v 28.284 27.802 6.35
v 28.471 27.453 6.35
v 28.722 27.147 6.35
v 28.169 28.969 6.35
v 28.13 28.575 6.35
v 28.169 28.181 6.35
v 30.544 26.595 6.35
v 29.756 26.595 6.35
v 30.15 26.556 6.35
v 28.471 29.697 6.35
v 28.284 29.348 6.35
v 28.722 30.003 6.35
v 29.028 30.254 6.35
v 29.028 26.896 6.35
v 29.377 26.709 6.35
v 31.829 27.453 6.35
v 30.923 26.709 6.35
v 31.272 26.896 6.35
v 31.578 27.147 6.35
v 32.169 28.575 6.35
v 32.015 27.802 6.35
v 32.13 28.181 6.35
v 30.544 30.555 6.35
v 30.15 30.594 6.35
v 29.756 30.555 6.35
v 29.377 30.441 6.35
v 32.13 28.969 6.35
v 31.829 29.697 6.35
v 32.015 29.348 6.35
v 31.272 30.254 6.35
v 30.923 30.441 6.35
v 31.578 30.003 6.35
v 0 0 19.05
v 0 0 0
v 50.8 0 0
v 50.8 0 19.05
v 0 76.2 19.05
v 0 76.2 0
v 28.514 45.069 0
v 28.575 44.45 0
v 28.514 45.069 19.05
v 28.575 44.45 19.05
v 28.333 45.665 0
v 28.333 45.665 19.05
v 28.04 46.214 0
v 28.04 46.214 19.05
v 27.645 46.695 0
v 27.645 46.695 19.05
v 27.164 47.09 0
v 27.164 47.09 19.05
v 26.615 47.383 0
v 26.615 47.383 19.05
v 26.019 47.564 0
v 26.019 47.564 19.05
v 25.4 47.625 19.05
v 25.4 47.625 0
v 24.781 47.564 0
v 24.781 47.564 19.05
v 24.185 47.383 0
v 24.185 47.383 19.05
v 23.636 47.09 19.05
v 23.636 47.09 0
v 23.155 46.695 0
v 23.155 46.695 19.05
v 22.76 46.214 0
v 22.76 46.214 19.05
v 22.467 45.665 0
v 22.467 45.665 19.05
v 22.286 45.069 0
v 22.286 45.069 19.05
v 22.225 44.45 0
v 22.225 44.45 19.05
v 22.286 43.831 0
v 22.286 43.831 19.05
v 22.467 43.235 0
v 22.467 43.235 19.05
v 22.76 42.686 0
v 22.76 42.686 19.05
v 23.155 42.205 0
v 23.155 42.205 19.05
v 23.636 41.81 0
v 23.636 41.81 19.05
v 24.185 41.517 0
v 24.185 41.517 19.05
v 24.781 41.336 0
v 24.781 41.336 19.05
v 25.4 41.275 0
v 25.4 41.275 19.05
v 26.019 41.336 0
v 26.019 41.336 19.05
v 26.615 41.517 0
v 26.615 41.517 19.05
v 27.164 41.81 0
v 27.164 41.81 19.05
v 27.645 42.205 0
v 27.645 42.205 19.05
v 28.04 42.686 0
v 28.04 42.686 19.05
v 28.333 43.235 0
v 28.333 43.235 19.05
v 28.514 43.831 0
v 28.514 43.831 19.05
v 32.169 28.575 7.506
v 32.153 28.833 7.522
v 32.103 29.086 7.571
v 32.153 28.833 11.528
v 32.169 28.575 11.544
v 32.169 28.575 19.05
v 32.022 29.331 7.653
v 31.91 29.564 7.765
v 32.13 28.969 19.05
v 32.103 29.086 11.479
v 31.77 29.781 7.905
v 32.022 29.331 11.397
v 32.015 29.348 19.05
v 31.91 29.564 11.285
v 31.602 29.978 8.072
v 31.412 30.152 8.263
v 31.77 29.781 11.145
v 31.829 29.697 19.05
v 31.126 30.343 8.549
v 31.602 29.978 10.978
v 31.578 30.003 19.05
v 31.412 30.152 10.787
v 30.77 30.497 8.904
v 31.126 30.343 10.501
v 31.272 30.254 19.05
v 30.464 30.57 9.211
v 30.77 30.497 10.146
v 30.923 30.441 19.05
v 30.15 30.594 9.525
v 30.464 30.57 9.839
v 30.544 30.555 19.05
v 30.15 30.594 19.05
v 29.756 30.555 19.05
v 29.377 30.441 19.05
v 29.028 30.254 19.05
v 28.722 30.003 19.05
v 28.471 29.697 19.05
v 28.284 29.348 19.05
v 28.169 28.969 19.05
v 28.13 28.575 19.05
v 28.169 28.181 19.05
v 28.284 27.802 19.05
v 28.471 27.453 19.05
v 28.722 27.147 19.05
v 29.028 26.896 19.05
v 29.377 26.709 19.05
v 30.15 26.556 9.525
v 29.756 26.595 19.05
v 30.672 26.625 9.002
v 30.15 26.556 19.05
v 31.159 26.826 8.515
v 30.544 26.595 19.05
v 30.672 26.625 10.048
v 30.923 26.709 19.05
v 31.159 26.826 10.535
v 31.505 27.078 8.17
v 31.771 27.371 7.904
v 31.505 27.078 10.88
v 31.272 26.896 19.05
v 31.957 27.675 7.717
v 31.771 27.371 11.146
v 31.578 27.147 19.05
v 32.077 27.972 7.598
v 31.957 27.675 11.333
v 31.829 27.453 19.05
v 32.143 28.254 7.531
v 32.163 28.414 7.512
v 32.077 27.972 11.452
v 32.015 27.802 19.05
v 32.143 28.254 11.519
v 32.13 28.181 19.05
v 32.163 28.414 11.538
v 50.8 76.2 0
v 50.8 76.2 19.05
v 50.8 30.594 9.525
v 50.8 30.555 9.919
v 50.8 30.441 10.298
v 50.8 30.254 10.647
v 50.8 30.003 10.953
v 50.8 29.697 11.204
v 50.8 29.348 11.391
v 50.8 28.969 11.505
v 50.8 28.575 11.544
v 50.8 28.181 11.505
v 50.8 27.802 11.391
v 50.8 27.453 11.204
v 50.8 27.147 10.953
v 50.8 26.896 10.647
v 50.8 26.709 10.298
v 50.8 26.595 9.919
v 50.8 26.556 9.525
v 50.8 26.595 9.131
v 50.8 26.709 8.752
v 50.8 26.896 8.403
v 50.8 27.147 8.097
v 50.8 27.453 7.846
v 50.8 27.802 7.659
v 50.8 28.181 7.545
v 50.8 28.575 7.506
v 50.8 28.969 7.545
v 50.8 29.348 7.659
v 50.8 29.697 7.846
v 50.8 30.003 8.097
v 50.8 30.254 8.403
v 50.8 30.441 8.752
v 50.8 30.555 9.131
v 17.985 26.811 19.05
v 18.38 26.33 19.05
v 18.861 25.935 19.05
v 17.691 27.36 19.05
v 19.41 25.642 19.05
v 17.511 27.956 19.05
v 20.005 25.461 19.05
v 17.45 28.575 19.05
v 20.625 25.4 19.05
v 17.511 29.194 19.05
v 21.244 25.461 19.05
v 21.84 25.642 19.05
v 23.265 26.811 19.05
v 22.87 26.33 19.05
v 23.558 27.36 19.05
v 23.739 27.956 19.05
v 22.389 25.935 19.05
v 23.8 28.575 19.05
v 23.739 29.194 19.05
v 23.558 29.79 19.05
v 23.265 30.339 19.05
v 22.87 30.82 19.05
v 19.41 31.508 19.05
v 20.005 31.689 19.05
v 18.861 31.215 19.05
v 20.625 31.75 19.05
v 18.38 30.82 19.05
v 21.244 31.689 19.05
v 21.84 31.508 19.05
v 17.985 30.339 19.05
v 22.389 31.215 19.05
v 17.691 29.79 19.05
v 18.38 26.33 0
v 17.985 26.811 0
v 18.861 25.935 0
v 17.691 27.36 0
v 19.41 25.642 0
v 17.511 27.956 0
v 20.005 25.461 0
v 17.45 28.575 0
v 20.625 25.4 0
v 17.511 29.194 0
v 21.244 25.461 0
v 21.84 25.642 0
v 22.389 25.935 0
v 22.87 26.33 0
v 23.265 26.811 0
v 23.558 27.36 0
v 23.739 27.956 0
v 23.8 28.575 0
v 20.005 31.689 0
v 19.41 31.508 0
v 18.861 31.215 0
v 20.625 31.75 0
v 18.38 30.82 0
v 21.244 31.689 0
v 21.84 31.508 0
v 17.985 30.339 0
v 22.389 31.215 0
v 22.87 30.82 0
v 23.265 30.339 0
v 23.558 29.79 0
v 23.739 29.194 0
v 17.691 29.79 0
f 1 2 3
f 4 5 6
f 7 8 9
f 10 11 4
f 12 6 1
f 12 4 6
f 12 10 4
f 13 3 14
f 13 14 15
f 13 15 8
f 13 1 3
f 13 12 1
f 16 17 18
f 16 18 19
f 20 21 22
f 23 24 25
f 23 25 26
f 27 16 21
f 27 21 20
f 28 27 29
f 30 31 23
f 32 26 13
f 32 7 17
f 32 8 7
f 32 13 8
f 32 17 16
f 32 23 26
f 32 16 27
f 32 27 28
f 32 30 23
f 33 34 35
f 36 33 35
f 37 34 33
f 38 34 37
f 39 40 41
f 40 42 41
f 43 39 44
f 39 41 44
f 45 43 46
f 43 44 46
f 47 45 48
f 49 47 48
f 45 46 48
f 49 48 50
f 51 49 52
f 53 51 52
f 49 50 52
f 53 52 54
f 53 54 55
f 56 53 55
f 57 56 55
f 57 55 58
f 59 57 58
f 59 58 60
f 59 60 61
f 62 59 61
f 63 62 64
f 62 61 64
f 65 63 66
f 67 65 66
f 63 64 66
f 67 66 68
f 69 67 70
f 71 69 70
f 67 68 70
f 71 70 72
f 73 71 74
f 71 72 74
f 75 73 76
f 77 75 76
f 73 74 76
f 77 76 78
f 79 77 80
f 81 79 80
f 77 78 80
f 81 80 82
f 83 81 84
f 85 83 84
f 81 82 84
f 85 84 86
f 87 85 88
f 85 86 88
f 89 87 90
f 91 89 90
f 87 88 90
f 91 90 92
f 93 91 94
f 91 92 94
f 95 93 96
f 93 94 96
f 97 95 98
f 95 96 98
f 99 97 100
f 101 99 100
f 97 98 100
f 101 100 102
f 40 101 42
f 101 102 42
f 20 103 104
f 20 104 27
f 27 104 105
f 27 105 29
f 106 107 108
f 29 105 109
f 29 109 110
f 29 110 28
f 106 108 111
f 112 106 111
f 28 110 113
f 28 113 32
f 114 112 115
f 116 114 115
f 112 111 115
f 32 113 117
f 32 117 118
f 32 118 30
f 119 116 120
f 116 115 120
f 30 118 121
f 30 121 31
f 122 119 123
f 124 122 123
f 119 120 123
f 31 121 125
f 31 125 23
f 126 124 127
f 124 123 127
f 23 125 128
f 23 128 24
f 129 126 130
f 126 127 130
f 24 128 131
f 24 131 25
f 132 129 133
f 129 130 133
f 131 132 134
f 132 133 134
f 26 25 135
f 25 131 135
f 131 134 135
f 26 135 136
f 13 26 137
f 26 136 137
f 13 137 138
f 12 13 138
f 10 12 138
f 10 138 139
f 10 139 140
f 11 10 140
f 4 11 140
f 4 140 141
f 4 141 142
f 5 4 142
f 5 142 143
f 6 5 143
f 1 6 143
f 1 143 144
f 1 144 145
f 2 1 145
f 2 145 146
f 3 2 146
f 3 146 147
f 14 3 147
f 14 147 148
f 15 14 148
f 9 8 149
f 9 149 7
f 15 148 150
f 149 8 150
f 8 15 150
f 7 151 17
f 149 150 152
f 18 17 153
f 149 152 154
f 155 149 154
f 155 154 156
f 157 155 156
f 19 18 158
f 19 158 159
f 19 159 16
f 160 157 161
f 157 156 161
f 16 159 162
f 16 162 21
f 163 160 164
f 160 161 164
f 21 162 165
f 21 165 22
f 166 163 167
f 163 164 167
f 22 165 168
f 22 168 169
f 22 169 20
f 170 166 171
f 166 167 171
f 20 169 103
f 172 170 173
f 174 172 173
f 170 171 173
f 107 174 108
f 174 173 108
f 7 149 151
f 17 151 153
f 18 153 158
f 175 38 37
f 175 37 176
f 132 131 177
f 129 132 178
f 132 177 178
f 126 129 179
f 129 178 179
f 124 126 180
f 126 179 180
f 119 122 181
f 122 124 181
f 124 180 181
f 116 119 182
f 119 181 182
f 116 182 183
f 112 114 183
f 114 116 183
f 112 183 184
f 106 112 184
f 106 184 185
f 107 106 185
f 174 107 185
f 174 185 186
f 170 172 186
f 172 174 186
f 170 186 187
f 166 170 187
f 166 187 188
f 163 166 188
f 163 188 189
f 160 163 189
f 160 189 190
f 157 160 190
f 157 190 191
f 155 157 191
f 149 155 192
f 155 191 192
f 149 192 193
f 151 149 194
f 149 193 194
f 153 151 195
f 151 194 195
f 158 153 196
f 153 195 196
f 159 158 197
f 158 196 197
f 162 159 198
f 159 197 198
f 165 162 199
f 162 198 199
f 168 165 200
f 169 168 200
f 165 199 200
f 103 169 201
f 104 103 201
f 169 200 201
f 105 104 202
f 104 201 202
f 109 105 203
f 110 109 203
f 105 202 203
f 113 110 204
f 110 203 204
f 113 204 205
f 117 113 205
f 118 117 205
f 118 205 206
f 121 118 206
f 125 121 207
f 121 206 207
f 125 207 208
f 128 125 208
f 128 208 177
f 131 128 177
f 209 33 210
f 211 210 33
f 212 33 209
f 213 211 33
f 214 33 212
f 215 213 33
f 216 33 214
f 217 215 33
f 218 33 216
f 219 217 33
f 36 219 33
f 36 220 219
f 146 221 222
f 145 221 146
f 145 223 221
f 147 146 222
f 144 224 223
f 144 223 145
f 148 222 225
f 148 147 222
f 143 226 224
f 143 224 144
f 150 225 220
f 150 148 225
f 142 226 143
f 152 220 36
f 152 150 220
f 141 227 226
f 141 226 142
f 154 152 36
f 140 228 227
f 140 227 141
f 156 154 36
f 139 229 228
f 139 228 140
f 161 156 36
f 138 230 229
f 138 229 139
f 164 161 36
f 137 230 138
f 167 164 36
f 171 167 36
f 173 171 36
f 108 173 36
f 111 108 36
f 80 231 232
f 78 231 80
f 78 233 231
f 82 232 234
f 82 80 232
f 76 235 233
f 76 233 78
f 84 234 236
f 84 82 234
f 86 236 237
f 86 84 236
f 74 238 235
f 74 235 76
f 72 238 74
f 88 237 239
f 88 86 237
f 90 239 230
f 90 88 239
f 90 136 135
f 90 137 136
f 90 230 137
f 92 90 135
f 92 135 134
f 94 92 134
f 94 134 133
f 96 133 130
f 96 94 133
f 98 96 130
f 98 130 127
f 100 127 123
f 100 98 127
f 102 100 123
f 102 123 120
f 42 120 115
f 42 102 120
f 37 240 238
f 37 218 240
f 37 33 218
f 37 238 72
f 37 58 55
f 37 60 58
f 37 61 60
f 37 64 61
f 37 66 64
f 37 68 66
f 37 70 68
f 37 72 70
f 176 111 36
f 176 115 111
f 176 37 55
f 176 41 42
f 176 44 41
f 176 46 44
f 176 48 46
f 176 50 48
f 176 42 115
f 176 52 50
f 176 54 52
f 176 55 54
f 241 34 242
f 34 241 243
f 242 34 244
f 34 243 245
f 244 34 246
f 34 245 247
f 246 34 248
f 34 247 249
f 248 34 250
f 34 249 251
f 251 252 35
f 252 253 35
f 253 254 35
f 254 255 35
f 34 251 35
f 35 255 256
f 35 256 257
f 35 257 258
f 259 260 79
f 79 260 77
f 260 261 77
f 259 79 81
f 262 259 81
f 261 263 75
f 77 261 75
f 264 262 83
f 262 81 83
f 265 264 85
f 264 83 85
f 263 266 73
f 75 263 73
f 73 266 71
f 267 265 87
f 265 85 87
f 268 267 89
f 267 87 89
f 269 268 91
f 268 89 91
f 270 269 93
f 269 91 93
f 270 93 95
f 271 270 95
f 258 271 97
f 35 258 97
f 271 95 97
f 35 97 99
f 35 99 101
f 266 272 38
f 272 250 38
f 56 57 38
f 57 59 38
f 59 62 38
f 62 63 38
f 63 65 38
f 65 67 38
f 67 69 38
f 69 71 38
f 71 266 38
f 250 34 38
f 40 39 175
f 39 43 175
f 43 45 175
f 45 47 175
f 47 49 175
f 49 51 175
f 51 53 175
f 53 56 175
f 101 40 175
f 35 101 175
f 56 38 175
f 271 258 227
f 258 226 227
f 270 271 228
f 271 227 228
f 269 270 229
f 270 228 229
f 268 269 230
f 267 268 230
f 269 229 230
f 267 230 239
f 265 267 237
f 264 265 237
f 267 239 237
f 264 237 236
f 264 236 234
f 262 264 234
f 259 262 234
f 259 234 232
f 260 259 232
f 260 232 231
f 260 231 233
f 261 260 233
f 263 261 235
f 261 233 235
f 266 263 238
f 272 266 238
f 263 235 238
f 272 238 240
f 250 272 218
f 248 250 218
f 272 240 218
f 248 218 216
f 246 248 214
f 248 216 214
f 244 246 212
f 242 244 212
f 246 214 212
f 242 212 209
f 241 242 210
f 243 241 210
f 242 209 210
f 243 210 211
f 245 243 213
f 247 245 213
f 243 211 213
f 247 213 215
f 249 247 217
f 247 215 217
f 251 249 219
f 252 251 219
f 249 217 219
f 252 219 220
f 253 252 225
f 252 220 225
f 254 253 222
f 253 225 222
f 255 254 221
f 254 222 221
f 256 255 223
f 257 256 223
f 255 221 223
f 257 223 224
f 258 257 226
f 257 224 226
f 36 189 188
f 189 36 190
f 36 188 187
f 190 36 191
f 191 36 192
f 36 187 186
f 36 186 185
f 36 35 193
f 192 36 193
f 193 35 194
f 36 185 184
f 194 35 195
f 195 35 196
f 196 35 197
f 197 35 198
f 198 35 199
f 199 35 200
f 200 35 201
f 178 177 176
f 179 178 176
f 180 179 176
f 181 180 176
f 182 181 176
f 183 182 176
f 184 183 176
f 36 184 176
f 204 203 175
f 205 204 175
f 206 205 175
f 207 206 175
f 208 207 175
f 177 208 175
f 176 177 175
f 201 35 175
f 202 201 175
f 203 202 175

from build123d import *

# Parameters (mm, degrees)
F0_W     = 50.8
F0_H     = 76.2
F1_DEPTH = 19.05
F2_R     = 3.175
F3_DEPTH = 19.05
F2_R_2   = 2.0193
F4_DEPTH = 12.7
F5_R     = 2.0193
F6_DEPTH = 20.6502


with BuildPart() as f1:
    # F0 (on Top) → F1 (new body)
    with BuildSketch(Plane.XY):
        with Locations((25.4, 38.1)):
            Rectangle(F0_W, F0_H)
    extrude(amount=F1_DEPTH)

    # F2 (on face) → F3 (cut)
    with BuildSketch(Plane.XY.offset(19.05)):
        with Locations((25.4, 44.45)):
            Circle(F2_R)
        with Locations((20.6248, 28.575)):
            Circle(F2_R)
    extrude(amount=-F3_DEPTH, mode=Mode.SUBTRACT)

    # F2 (on face) → F4 (cut)
    with BuildSketch(Plane.XY.offset(19.05)):
        with Locations((25.4, 44.45)):
            Circle(F2_R)
        with Locations((20.6248, 28.575)):
            Circle(F2_R)
        with Locations((30.1498, 28.575)):
            Circle(F2_R_2)
    extrude(amount=-F4_DEPTH, mode=Mode.SUBTRACT)

    # F5 (on face) → F6 (cut)
    with BuildSketch(Plane.YZ.offset(50.8)):
        with Locations((28.575, 9.525)):
            Circle(F5_R)
    extrude(amount=-F6_DEPTH, mode=Mode.SUBTRACT)


solid = f1.part
